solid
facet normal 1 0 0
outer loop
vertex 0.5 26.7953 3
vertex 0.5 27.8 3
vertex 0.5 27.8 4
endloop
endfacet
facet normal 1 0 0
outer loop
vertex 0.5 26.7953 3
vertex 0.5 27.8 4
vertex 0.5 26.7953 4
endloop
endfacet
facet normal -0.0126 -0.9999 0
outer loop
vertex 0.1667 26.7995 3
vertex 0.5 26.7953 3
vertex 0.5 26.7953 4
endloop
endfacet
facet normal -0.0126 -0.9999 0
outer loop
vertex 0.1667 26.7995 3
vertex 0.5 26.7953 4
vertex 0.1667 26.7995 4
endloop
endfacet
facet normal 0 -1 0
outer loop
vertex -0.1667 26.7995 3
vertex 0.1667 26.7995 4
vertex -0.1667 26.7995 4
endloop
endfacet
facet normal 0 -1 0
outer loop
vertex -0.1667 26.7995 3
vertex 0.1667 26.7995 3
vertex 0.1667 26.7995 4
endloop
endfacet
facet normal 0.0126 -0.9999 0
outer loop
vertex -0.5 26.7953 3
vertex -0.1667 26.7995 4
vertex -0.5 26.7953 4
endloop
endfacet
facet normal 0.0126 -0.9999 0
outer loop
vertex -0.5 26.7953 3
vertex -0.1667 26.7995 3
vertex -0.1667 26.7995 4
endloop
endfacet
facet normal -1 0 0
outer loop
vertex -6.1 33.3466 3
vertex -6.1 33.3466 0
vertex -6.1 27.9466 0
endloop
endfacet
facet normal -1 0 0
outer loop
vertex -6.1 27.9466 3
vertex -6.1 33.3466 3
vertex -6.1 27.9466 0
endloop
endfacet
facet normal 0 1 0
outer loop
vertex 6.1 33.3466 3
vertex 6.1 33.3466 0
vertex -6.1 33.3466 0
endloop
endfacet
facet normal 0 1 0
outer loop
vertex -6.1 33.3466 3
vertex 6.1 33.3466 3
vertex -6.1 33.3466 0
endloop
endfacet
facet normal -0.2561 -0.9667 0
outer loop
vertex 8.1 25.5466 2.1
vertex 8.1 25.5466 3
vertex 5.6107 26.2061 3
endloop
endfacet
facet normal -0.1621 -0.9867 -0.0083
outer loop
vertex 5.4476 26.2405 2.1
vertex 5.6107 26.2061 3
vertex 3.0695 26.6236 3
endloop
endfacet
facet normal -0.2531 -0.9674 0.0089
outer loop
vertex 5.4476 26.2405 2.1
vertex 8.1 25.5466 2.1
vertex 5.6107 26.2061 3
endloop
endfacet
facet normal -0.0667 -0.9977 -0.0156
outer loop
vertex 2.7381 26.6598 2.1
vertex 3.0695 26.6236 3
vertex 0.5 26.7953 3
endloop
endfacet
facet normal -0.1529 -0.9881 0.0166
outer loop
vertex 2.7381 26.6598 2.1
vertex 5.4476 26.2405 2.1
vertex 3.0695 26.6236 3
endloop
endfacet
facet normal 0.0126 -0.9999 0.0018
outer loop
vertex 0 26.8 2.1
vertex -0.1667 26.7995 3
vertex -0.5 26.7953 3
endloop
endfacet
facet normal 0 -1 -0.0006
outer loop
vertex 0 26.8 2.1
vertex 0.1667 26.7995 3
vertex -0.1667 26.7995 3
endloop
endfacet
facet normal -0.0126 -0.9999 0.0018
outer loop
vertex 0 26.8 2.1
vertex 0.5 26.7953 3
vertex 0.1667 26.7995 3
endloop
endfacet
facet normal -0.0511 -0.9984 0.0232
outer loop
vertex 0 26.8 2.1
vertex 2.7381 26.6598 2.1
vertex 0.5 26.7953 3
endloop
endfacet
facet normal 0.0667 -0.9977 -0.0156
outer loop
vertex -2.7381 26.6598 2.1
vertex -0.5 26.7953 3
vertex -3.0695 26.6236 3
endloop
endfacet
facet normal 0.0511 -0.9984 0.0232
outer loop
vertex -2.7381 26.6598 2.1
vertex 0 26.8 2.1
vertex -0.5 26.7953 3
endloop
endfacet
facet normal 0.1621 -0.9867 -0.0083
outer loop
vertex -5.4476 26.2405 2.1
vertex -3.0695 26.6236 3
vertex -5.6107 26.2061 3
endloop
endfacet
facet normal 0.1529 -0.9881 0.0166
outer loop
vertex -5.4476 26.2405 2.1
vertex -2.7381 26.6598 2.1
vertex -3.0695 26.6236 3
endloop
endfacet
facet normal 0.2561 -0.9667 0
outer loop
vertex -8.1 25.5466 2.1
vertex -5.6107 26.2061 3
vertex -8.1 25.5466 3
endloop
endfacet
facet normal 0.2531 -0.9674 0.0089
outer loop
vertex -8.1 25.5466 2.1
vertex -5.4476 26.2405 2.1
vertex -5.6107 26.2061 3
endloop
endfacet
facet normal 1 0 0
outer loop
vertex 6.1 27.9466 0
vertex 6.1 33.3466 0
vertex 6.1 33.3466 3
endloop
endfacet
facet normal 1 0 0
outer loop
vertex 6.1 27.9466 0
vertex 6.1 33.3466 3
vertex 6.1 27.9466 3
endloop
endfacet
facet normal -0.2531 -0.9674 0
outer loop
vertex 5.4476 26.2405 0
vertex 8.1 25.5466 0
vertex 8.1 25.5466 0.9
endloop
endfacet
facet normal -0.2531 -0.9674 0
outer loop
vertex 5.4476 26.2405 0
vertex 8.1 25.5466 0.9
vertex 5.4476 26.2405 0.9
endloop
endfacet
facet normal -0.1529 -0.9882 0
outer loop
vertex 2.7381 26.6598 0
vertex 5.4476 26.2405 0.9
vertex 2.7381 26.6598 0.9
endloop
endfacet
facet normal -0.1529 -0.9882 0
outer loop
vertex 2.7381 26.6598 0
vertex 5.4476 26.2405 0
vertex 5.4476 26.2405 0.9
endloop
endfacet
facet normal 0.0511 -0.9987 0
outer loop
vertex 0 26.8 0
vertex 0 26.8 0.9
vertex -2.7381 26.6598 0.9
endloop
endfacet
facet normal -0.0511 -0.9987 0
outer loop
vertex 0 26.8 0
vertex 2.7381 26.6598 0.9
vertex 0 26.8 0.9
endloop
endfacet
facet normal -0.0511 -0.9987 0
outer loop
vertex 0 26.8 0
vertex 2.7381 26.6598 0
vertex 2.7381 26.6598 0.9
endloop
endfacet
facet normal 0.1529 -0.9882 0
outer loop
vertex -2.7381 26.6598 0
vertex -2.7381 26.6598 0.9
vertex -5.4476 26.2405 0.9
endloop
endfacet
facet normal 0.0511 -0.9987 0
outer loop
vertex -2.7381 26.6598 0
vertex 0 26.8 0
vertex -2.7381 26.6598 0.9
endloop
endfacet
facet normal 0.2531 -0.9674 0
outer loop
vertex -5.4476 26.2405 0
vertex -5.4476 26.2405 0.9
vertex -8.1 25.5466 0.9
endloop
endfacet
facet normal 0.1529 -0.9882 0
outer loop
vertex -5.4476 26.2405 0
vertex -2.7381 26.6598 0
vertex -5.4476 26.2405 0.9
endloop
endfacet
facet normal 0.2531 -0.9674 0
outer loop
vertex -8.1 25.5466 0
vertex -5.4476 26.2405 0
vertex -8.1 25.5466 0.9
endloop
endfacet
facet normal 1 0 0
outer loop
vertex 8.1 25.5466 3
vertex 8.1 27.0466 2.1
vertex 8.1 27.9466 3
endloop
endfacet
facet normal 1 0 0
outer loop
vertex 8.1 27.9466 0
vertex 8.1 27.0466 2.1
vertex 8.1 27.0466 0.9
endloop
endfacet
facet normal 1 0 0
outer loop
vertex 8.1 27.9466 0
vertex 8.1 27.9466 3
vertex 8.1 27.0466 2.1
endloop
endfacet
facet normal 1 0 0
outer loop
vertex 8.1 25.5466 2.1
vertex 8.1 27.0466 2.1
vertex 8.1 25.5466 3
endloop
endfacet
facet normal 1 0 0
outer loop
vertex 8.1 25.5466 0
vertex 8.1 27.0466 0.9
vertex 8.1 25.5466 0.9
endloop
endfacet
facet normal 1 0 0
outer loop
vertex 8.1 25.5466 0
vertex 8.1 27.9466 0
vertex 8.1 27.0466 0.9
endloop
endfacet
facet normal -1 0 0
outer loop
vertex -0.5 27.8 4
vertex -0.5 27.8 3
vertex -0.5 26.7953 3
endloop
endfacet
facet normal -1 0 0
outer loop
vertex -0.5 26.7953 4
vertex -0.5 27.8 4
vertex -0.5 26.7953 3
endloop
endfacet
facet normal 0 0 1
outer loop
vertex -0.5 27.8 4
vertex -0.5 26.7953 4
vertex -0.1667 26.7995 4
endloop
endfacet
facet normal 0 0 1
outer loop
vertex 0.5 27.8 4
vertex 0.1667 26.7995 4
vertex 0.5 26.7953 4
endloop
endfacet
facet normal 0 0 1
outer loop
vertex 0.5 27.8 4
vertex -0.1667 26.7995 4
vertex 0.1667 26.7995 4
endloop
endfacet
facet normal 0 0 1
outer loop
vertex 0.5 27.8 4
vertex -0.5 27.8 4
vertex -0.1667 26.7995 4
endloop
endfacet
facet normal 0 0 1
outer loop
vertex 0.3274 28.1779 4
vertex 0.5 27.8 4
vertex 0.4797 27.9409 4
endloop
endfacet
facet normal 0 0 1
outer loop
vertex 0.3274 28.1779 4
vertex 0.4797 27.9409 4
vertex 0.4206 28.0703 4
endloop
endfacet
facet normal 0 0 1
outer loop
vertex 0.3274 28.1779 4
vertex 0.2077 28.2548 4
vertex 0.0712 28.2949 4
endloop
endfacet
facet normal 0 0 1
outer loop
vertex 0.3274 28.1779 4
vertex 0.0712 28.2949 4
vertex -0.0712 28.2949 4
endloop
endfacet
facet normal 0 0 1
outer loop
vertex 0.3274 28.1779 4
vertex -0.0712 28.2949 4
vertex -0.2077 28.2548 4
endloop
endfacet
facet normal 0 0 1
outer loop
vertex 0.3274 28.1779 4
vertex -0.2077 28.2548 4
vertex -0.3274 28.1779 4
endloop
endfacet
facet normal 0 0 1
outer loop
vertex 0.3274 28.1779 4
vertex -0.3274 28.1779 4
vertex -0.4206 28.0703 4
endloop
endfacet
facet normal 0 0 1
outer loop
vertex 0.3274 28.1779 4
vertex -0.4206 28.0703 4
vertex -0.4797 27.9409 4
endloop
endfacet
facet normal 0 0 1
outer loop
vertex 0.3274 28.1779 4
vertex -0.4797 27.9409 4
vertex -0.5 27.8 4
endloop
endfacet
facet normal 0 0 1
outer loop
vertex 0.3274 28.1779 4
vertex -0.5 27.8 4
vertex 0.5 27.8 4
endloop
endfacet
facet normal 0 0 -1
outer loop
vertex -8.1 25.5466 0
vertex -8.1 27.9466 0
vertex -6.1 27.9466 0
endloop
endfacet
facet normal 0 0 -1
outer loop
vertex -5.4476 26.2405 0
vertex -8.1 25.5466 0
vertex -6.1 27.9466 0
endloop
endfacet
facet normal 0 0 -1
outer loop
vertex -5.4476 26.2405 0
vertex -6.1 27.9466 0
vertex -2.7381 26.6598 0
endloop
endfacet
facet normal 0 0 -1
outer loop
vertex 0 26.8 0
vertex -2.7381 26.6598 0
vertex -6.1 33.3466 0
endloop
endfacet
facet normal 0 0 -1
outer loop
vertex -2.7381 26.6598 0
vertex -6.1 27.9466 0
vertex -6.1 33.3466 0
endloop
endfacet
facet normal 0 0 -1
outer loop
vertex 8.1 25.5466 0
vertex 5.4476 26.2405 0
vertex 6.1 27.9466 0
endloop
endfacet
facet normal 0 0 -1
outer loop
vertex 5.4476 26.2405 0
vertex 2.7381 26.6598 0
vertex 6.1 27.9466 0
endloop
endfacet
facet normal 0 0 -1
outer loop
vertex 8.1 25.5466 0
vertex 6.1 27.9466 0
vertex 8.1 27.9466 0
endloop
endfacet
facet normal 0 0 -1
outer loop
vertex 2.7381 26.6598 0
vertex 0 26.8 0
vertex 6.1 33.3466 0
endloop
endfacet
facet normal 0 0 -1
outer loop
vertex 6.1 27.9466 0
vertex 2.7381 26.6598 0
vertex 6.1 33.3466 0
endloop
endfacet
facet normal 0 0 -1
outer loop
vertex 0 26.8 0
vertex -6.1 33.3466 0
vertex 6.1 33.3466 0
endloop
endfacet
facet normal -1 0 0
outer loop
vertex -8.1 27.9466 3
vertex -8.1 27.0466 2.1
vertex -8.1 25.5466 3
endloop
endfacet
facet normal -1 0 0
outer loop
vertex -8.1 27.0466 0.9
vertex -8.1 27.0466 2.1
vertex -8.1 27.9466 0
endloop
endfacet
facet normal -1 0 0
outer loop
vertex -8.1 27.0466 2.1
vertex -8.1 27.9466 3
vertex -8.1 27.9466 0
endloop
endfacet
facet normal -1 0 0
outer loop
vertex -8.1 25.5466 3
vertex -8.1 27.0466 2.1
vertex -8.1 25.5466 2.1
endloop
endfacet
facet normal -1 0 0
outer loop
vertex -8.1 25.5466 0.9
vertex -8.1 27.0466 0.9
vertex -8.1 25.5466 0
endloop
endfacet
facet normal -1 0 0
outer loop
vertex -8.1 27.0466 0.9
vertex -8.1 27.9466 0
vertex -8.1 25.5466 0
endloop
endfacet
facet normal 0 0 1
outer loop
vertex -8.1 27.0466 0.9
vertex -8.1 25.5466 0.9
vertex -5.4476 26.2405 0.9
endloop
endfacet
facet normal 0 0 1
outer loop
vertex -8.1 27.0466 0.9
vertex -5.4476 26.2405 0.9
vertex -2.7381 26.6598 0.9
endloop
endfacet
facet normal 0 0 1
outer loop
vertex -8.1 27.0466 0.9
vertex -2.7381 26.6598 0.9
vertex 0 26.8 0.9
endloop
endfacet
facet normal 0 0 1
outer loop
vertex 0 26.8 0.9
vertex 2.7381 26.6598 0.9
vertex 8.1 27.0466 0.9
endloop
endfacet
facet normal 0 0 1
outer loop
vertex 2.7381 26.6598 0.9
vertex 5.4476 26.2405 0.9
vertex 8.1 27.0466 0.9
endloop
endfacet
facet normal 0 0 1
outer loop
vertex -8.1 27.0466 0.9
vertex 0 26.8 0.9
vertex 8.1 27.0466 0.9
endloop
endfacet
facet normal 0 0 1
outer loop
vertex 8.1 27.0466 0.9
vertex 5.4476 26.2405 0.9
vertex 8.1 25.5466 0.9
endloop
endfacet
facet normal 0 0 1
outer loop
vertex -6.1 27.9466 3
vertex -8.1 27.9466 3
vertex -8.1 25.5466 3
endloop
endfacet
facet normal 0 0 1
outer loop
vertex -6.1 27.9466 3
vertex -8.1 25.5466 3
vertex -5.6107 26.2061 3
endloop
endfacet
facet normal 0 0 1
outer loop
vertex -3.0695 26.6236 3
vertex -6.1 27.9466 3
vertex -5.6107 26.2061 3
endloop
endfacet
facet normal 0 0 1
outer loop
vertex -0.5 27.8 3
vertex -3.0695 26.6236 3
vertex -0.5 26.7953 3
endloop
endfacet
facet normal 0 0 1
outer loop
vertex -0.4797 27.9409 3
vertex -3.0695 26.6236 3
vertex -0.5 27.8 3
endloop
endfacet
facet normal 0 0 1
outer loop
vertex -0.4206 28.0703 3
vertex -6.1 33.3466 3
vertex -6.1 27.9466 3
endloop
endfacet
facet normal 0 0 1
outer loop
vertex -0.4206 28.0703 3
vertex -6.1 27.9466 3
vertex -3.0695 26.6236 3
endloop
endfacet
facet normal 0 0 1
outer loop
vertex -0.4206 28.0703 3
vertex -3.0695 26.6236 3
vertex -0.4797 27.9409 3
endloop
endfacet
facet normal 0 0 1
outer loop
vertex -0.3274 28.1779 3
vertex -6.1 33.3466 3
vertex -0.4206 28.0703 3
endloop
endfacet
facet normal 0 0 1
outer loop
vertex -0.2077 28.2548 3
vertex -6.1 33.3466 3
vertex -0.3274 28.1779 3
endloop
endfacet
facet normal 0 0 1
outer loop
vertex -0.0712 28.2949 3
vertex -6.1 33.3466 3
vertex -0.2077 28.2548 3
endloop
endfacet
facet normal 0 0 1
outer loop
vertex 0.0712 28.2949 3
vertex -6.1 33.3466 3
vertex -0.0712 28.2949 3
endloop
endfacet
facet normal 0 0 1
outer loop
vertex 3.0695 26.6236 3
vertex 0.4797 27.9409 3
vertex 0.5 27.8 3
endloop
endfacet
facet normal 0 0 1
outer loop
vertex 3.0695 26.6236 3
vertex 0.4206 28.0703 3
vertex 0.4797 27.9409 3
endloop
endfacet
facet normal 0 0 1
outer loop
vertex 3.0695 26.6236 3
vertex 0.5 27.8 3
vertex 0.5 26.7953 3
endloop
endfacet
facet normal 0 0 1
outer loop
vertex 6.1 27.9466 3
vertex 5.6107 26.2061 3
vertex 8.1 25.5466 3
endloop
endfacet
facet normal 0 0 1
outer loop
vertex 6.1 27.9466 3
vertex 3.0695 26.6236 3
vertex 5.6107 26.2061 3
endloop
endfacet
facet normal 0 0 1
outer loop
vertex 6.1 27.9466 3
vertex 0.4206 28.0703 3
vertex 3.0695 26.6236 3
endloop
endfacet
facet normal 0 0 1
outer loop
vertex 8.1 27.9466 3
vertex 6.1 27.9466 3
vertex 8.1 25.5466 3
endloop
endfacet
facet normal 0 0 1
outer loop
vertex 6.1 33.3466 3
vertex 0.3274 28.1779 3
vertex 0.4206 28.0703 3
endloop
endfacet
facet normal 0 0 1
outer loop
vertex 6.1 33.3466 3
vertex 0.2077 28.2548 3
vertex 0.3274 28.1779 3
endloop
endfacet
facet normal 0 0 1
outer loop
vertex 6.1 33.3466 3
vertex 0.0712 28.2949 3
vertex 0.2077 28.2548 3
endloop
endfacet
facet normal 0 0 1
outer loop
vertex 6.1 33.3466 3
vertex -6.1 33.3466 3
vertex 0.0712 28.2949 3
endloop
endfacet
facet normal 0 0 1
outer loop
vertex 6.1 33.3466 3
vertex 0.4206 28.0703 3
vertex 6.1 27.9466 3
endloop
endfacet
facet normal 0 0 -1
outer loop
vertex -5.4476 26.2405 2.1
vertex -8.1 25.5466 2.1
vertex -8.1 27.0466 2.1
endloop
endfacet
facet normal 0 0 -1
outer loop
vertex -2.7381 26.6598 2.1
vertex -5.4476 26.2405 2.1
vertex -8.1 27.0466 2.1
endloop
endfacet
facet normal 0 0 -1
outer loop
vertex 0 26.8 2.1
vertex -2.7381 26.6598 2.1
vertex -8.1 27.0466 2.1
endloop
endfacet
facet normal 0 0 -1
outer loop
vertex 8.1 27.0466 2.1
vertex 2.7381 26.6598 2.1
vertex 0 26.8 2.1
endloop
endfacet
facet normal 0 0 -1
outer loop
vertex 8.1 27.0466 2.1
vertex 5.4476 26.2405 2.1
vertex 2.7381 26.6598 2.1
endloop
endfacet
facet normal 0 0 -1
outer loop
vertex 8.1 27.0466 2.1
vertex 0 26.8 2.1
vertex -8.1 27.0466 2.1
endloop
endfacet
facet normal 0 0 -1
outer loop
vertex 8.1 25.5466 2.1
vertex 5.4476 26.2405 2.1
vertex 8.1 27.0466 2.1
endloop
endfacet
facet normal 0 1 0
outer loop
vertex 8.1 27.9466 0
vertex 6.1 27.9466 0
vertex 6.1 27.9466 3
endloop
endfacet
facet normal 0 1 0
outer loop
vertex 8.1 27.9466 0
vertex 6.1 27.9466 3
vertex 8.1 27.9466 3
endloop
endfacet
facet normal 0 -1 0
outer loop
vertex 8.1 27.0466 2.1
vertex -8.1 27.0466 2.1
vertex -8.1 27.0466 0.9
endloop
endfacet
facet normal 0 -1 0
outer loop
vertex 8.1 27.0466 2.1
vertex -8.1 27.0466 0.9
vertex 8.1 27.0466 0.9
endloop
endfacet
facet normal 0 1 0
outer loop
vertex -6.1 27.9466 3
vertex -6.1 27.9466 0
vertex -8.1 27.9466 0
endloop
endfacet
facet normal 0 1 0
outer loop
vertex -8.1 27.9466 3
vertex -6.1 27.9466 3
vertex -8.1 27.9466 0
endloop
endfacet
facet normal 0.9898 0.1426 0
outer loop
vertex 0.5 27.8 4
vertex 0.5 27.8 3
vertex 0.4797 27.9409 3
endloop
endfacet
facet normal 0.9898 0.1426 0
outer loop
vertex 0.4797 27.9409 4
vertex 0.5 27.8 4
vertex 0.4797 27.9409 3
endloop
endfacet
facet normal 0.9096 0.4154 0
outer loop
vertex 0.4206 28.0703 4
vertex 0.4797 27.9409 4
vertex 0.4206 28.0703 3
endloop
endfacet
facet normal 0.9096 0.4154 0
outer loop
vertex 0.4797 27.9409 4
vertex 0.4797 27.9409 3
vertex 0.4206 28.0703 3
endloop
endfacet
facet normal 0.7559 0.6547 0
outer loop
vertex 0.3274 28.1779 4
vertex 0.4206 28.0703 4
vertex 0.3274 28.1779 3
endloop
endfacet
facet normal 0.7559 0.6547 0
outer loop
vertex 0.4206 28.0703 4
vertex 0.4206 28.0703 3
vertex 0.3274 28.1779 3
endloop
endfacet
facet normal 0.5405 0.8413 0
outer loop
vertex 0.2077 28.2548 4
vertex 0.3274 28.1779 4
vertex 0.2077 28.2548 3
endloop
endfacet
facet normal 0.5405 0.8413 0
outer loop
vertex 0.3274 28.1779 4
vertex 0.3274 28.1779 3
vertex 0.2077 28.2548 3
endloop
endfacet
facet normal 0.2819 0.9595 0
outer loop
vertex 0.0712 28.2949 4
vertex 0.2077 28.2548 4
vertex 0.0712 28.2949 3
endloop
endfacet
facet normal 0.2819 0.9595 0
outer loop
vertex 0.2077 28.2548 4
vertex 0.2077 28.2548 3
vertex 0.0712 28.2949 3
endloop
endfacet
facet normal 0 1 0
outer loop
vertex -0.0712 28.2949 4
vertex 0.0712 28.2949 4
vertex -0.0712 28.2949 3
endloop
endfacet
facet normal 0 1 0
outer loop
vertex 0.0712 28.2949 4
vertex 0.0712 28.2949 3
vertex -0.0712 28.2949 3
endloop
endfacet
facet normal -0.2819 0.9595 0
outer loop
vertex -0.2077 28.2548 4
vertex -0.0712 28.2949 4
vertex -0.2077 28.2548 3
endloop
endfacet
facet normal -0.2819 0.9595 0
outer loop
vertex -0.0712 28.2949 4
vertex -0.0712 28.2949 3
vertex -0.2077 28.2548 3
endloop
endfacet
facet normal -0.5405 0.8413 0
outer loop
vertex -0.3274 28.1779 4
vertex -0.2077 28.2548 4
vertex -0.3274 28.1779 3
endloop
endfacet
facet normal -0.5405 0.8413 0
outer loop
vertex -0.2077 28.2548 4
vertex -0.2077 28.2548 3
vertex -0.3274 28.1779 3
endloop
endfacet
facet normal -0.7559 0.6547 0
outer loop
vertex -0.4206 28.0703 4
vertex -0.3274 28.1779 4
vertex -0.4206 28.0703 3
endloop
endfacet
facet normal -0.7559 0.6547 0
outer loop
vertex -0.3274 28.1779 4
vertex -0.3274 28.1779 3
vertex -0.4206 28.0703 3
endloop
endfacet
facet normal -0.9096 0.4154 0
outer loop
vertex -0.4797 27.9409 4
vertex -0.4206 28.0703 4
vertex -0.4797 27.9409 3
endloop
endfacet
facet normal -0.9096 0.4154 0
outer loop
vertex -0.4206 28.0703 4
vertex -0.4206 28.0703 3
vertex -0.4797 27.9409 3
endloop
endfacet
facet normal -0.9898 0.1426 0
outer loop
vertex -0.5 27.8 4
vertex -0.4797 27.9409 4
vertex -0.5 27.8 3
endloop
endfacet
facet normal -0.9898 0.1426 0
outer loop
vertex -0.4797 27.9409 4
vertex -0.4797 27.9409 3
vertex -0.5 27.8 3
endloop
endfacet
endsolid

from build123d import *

# Parameters (mm, degrees)
PAD_DEPTH    = 3
SKETCH001_W  = 16.2
SKETCH001_H  = 1.2
POCKET_DEPTH = 1.5
PAD001_DEPTH = 1


with BuildPart() as part:
    # Sketch → Pad (new body)
    with BuildSketch(Plane.XY):
        with BuildLine():
            Line((6.1, 33.346624), (-6.1, 33.346624))
            Line((-6.1, 33.346624), (-6.1, 27.946624))
            Line((-6.1, 27.946624), (-8.1, 27.946624))
            Line((-8.1, 27.946624), (-8.1, 25.546624))
            ThreePointArc((8.1, 25.546624), (0, 26.8), (-8.1, 25.546624))
            Line((8.1, 27.946624), (8.1, 25.546624))
            Line((6.1, 27.946624), (8.1, 27.946624))
            Line((6.1, 33.346624), (6.1, 27.946624))
        make_face()
    extrude(amount=PAD_DEPTH)

    # Sketch001 (on DatumPlane) → Pocket (cut)
    with BuildSketch(Plane(origin=(2.7, 25.546624, 1), x_dir=(1, 0, 0), z_dir=(0, -1, 0))):
        with Locations((-2.7, 0.5)):
            Rectangle(SKETCH001_W, SKETCH001_H)
    extrude(amount=-POCKET_DEPTH, mode=Mode.SUBTRACT)

    # Sketch002 (on Face5 of Pocket) → Pad001 (join)
    with BuildSketch(Plane.XY.offset(3)):
        with BuildLine():
            ThreePointArc((0.5, 27.8), (0, 28.3), (-0.5, 27.8))
            Line((-0.5, 27.8), (-0.5, 26.795335))
            ThreePointArc((0.5, 26.795335), (0, 26.8), (-0.5, 26.795335))
            Line((0.5, 27.8), (0.5, 26.795335))
        make_face()
    extrude(amount=PAD001_DEPTH)


solid = part.part
